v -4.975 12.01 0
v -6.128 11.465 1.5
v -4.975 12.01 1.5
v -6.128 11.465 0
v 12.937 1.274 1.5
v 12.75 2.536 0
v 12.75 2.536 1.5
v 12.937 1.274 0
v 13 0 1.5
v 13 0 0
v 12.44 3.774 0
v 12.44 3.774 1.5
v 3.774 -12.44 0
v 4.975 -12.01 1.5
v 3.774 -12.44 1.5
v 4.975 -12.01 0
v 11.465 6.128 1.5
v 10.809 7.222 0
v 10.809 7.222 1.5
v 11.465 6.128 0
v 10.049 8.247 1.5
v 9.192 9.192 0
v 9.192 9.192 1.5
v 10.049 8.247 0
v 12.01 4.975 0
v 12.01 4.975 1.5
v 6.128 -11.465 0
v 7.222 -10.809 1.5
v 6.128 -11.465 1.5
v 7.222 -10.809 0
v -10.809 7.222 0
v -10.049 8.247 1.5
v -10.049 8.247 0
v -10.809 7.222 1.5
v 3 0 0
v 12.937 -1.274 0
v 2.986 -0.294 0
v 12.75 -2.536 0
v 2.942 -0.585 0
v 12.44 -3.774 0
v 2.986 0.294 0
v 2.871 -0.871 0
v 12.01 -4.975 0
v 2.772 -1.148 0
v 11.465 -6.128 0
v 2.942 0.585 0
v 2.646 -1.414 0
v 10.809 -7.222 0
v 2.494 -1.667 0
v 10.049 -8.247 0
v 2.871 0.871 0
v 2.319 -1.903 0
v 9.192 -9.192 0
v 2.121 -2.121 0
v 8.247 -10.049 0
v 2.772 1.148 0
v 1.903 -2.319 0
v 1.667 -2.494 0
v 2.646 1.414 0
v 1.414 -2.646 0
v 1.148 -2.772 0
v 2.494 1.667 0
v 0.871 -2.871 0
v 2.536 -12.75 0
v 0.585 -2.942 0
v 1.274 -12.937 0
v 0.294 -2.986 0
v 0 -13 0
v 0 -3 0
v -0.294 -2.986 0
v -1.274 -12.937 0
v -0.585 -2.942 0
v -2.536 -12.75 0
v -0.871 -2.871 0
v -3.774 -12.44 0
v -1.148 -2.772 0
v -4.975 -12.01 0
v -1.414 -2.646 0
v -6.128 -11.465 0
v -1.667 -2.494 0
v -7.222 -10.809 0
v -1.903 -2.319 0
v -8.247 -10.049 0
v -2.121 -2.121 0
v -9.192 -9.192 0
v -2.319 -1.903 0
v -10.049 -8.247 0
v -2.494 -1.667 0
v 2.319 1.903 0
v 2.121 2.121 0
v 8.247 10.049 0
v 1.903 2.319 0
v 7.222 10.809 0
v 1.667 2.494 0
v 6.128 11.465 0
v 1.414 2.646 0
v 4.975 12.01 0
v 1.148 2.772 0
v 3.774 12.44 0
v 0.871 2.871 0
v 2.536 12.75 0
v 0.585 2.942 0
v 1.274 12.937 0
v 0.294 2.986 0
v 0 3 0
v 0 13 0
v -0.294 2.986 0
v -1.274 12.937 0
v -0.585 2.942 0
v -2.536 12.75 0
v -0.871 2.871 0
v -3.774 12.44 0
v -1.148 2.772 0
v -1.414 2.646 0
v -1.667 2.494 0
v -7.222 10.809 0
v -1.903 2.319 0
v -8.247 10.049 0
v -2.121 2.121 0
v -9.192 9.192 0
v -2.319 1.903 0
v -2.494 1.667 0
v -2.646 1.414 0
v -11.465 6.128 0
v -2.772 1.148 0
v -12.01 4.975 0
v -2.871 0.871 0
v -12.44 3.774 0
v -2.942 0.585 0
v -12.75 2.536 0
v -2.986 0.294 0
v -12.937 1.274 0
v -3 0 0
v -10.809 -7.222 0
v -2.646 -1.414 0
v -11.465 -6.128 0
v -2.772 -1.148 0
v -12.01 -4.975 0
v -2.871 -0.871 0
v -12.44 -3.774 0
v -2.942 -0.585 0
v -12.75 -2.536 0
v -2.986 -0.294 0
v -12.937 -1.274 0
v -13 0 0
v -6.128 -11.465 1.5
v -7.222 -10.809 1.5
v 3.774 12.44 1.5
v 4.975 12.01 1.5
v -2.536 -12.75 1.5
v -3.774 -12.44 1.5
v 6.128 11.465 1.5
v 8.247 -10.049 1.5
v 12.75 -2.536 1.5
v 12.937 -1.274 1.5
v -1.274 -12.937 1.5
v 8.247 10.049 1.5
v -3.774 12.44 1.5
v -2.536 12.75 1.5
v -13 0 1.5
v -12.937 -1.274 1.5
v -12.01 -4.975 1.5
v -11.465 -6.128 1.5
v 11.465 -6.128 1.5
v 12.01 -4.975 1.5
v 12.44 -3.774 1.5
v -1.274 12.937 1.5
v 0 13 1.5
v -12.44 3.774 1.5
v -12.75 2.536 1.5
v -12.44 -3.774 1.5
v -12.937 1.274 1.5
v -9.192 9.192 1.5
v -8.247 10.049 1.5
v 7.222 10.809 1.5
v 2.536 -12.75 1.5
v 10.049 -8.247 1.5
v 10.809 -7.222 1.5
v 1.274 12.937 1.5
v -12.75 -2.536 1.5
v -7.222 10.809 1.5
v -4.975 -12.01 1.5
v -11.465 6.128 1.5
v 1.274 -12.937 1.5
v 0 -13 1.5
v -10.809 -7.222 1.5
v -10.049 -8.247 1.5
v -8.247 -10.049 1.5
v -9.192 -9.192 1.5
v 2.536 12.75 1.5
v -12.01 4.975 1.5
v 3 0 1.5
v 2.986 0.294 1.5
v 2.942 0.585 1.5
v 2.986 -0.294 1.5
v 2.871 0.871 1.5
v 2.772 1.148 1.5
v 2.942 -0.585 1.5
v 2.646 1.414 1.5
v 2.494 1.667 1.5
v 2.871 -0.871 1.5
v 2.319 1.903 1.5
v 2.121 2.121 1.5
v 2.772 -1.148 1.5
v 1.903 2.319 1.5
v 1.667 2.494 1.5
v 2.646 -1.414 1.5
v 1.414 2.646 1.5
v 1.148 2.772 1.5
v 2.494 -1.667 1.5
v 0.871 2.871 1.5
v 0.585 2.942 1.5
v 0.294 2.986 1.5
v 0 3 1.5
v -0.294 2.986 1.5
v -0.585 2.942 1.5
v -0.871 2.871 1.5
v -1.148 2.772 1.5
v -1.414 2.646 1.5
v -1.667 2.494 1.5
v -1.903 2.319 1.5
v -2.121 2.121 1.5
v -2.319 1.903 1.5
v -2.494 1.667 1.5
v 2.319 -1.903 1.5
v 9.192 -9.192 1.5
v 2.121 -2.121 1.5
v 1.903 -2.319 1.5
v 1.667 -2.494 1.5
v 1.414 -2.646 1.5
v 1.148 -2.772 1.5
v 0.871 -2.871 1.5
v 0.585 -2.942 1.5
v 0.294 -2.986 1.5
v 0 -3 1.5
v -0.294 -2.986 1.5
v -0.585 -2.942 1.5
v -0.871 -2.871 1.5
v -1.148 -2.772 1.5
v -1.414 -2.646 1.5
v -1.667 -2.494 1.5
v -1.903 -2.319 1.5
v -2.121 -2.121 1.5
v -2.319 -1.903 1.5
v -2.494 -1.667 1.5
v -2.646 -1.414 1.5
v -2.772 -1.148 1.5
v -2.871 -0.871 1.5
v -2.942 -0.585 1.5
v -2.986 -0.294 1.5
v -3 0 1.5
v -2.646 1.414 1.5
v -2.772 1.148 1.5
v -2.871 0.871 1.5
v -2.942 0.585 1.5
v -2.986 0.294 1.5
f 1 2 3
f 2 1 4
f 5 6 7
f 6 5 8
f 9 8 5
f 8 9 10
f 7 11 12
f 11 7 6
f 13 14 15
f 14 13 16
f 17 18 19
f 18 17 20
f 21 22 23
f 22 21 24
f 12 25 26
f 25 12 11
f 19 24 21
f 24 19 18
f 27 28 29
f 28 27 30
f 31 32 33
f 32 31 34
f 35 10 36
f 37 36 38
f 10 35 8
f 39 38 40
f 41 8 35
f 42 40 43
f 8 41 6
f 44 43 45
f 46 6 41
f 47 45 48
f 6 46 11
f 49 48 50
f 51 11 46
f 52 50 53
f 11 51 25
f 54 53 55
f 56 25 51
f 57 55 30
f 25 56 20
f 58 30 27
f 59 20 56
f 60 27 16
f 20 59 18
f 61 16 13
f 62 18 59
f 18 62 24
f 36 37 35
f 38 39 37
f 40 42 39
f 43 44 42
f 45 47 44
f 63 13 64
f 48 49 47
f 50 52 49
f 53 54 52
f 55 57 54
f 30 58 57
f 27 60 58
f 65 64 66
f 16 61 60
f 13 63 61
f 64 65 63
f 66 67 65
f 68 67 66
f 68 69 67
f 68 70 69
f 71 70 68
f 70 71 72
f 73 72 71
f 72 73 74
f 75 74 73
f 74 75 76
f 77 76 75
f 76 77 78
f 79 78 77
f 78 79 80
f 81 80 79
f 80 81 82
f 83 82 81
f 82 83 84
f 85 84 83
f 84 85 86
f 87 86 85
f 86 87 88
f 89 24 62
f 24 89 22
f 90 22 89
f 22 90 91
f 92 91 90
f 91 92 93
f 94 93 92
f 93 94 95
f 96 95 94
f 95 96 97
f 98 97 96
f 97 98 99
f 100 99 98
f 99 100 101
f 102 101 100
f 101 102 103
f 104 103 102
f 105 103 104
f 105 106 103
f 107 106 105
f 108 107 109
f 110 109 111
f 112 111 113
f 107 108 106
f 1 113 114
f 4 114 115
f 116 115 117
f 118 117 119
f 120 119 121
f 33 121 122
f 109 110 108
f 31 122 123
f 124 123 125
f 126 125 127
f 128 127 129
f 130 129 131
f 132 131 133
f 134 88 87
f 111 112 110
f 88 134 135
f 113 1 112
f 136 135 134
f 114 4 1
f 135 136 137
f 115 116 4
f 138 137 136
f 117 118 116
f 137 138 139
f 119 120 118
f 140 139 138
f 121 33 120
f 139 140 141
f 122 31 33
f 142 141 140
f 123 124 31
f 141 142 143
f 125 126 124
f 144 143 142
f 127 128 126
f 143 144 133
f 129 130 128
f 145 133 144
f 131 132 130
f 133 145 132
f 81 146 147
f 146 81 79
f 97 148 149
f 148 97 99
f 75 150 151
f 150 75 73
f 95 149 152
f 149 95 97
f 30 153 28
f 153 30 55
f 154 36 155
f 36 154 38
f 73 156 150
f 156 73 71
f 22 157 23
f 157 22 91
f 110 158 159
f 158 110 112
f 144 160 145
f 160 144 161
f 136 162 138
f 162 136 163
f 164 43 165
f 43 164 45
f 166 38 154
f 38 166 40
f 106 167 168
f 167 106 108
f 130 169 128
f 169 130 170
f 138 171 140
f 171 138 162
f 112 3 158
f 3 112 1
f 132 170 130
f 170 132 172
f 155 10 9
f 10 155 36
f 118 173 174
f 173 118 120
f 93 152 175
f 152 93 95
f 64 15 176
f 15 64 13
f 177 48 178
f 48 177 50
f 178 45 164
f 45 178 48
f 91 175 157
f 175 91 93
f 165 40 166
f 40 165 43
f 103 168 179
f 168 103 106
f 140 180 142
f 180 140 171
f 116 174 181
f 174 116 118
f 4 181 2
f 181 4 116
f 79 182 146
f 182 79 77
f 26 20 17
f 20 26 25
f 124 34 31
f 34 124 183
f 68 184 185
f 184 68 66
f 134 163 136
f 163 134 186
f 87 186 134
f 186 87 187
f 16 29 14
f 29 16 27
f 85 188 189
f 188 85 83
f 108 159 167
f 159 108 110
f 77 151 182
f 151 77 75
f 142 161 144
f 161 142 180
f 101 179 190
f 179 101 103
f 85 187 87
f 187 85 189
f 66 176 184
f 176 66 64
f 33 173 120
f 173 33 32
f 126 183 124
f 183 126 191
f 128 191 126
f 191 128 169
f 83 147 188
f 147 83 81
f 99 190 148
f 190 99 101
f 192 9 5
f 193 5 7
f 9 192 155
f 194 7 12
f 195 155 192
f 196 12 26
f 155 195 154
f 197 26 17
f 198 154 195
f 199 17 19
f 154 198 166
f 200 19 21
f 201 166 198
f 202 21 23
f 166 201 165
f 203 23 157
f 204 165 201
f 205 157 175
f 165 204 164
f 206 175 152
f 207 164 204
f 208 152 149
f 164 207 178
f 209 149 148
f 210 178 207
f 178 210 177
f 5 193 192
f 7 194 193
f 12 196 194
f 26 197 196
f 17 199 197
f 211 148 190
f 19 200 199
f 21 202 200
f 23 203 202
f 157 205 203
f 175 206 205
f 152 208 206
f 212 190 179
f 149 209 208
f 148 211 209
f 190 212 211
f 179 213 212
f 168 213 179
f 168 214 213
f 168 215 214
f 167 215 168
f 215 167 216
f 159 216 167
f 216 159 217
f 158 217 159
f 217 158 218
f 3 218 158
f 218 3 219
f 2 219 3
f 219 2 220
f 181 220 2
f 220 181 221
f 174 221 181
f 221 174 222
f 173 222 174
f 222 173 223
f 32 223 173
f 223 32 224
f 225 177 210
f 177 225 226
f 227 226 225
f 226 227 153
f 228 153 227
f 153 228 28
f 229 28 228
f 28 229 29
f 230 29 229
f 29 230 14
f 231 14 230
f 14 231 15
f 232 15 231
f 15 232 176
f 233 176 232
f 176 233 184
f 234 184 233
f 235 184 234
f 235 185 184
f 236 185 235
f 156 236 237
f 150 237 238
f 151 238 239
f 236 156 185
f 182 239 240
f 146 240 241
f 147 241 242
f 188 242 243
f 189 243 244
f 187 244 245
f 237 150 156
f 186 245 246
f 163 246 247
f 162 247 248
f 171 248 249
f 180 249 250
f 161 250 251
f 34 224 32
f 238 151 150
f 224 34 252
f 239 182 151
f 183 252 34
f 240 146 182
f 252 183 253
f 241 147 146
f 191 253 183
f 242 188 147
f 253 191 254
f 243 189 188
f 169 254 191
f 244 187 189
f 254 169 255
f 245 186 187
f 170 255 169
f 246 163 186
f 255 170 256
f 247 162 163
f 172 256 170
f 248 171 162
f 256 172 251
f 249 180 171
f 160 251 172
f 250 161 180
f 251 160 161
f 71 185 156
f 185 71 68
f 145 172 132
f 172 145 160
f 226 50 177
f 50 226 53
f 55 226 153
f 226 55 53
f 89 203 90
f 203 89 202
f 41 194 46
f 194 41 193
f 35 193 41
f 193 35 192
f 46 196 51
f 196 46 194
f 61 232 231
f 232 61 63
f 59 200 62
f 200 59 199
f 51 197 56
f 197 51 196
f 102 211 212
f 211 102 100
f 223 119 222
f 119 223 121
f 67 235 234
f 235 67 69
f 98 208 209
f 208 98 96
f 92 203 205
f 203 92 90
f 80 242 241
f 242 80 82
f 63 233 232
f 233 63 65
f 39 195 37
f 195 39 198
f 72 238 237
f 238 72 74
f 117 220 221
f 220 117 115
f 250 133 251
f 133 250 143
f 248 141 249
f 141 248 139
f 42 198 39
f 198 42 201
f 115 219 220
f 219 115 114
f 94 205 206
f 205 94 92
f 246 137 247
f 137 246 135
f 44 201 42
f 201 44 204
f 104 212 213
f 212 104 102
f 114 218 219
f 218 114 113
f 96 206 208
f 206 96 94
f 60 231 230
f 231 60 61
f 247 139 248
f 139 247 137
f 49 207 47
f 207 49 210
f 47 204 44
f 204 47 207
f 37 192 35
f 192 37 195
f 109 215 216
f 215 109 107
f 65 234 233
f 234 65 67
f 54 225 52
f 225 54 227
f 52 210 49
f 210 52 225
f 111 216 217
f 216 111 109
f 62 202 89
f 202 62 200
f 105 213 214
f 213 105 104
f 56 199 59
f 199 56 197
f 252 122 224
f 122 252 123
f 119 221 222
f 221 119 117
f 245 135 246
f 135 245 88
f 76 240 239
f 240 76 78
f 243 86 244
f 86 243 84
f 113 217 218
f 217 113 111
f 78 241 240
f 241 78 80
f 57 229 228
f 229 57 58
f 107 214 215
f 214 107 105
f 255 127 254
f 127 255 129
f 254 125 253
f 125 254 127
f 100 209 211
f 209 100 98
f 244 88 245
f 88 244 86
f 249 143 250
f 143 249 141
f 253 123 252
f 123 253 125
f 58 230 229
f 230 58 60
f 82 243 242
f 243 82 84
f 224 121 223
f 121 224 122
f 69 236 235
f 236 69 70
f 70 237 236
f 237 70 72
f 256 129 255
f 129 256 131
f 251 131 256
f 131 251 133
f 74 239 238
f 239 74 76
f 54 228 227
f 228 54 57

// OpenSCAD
difference() {
    cylinder(h=1.5, d=26.0, $fn=64);
    translate([0, 0, -0.1])
        cylinder(h=1.7, d=6.0, $fn=64);
}
